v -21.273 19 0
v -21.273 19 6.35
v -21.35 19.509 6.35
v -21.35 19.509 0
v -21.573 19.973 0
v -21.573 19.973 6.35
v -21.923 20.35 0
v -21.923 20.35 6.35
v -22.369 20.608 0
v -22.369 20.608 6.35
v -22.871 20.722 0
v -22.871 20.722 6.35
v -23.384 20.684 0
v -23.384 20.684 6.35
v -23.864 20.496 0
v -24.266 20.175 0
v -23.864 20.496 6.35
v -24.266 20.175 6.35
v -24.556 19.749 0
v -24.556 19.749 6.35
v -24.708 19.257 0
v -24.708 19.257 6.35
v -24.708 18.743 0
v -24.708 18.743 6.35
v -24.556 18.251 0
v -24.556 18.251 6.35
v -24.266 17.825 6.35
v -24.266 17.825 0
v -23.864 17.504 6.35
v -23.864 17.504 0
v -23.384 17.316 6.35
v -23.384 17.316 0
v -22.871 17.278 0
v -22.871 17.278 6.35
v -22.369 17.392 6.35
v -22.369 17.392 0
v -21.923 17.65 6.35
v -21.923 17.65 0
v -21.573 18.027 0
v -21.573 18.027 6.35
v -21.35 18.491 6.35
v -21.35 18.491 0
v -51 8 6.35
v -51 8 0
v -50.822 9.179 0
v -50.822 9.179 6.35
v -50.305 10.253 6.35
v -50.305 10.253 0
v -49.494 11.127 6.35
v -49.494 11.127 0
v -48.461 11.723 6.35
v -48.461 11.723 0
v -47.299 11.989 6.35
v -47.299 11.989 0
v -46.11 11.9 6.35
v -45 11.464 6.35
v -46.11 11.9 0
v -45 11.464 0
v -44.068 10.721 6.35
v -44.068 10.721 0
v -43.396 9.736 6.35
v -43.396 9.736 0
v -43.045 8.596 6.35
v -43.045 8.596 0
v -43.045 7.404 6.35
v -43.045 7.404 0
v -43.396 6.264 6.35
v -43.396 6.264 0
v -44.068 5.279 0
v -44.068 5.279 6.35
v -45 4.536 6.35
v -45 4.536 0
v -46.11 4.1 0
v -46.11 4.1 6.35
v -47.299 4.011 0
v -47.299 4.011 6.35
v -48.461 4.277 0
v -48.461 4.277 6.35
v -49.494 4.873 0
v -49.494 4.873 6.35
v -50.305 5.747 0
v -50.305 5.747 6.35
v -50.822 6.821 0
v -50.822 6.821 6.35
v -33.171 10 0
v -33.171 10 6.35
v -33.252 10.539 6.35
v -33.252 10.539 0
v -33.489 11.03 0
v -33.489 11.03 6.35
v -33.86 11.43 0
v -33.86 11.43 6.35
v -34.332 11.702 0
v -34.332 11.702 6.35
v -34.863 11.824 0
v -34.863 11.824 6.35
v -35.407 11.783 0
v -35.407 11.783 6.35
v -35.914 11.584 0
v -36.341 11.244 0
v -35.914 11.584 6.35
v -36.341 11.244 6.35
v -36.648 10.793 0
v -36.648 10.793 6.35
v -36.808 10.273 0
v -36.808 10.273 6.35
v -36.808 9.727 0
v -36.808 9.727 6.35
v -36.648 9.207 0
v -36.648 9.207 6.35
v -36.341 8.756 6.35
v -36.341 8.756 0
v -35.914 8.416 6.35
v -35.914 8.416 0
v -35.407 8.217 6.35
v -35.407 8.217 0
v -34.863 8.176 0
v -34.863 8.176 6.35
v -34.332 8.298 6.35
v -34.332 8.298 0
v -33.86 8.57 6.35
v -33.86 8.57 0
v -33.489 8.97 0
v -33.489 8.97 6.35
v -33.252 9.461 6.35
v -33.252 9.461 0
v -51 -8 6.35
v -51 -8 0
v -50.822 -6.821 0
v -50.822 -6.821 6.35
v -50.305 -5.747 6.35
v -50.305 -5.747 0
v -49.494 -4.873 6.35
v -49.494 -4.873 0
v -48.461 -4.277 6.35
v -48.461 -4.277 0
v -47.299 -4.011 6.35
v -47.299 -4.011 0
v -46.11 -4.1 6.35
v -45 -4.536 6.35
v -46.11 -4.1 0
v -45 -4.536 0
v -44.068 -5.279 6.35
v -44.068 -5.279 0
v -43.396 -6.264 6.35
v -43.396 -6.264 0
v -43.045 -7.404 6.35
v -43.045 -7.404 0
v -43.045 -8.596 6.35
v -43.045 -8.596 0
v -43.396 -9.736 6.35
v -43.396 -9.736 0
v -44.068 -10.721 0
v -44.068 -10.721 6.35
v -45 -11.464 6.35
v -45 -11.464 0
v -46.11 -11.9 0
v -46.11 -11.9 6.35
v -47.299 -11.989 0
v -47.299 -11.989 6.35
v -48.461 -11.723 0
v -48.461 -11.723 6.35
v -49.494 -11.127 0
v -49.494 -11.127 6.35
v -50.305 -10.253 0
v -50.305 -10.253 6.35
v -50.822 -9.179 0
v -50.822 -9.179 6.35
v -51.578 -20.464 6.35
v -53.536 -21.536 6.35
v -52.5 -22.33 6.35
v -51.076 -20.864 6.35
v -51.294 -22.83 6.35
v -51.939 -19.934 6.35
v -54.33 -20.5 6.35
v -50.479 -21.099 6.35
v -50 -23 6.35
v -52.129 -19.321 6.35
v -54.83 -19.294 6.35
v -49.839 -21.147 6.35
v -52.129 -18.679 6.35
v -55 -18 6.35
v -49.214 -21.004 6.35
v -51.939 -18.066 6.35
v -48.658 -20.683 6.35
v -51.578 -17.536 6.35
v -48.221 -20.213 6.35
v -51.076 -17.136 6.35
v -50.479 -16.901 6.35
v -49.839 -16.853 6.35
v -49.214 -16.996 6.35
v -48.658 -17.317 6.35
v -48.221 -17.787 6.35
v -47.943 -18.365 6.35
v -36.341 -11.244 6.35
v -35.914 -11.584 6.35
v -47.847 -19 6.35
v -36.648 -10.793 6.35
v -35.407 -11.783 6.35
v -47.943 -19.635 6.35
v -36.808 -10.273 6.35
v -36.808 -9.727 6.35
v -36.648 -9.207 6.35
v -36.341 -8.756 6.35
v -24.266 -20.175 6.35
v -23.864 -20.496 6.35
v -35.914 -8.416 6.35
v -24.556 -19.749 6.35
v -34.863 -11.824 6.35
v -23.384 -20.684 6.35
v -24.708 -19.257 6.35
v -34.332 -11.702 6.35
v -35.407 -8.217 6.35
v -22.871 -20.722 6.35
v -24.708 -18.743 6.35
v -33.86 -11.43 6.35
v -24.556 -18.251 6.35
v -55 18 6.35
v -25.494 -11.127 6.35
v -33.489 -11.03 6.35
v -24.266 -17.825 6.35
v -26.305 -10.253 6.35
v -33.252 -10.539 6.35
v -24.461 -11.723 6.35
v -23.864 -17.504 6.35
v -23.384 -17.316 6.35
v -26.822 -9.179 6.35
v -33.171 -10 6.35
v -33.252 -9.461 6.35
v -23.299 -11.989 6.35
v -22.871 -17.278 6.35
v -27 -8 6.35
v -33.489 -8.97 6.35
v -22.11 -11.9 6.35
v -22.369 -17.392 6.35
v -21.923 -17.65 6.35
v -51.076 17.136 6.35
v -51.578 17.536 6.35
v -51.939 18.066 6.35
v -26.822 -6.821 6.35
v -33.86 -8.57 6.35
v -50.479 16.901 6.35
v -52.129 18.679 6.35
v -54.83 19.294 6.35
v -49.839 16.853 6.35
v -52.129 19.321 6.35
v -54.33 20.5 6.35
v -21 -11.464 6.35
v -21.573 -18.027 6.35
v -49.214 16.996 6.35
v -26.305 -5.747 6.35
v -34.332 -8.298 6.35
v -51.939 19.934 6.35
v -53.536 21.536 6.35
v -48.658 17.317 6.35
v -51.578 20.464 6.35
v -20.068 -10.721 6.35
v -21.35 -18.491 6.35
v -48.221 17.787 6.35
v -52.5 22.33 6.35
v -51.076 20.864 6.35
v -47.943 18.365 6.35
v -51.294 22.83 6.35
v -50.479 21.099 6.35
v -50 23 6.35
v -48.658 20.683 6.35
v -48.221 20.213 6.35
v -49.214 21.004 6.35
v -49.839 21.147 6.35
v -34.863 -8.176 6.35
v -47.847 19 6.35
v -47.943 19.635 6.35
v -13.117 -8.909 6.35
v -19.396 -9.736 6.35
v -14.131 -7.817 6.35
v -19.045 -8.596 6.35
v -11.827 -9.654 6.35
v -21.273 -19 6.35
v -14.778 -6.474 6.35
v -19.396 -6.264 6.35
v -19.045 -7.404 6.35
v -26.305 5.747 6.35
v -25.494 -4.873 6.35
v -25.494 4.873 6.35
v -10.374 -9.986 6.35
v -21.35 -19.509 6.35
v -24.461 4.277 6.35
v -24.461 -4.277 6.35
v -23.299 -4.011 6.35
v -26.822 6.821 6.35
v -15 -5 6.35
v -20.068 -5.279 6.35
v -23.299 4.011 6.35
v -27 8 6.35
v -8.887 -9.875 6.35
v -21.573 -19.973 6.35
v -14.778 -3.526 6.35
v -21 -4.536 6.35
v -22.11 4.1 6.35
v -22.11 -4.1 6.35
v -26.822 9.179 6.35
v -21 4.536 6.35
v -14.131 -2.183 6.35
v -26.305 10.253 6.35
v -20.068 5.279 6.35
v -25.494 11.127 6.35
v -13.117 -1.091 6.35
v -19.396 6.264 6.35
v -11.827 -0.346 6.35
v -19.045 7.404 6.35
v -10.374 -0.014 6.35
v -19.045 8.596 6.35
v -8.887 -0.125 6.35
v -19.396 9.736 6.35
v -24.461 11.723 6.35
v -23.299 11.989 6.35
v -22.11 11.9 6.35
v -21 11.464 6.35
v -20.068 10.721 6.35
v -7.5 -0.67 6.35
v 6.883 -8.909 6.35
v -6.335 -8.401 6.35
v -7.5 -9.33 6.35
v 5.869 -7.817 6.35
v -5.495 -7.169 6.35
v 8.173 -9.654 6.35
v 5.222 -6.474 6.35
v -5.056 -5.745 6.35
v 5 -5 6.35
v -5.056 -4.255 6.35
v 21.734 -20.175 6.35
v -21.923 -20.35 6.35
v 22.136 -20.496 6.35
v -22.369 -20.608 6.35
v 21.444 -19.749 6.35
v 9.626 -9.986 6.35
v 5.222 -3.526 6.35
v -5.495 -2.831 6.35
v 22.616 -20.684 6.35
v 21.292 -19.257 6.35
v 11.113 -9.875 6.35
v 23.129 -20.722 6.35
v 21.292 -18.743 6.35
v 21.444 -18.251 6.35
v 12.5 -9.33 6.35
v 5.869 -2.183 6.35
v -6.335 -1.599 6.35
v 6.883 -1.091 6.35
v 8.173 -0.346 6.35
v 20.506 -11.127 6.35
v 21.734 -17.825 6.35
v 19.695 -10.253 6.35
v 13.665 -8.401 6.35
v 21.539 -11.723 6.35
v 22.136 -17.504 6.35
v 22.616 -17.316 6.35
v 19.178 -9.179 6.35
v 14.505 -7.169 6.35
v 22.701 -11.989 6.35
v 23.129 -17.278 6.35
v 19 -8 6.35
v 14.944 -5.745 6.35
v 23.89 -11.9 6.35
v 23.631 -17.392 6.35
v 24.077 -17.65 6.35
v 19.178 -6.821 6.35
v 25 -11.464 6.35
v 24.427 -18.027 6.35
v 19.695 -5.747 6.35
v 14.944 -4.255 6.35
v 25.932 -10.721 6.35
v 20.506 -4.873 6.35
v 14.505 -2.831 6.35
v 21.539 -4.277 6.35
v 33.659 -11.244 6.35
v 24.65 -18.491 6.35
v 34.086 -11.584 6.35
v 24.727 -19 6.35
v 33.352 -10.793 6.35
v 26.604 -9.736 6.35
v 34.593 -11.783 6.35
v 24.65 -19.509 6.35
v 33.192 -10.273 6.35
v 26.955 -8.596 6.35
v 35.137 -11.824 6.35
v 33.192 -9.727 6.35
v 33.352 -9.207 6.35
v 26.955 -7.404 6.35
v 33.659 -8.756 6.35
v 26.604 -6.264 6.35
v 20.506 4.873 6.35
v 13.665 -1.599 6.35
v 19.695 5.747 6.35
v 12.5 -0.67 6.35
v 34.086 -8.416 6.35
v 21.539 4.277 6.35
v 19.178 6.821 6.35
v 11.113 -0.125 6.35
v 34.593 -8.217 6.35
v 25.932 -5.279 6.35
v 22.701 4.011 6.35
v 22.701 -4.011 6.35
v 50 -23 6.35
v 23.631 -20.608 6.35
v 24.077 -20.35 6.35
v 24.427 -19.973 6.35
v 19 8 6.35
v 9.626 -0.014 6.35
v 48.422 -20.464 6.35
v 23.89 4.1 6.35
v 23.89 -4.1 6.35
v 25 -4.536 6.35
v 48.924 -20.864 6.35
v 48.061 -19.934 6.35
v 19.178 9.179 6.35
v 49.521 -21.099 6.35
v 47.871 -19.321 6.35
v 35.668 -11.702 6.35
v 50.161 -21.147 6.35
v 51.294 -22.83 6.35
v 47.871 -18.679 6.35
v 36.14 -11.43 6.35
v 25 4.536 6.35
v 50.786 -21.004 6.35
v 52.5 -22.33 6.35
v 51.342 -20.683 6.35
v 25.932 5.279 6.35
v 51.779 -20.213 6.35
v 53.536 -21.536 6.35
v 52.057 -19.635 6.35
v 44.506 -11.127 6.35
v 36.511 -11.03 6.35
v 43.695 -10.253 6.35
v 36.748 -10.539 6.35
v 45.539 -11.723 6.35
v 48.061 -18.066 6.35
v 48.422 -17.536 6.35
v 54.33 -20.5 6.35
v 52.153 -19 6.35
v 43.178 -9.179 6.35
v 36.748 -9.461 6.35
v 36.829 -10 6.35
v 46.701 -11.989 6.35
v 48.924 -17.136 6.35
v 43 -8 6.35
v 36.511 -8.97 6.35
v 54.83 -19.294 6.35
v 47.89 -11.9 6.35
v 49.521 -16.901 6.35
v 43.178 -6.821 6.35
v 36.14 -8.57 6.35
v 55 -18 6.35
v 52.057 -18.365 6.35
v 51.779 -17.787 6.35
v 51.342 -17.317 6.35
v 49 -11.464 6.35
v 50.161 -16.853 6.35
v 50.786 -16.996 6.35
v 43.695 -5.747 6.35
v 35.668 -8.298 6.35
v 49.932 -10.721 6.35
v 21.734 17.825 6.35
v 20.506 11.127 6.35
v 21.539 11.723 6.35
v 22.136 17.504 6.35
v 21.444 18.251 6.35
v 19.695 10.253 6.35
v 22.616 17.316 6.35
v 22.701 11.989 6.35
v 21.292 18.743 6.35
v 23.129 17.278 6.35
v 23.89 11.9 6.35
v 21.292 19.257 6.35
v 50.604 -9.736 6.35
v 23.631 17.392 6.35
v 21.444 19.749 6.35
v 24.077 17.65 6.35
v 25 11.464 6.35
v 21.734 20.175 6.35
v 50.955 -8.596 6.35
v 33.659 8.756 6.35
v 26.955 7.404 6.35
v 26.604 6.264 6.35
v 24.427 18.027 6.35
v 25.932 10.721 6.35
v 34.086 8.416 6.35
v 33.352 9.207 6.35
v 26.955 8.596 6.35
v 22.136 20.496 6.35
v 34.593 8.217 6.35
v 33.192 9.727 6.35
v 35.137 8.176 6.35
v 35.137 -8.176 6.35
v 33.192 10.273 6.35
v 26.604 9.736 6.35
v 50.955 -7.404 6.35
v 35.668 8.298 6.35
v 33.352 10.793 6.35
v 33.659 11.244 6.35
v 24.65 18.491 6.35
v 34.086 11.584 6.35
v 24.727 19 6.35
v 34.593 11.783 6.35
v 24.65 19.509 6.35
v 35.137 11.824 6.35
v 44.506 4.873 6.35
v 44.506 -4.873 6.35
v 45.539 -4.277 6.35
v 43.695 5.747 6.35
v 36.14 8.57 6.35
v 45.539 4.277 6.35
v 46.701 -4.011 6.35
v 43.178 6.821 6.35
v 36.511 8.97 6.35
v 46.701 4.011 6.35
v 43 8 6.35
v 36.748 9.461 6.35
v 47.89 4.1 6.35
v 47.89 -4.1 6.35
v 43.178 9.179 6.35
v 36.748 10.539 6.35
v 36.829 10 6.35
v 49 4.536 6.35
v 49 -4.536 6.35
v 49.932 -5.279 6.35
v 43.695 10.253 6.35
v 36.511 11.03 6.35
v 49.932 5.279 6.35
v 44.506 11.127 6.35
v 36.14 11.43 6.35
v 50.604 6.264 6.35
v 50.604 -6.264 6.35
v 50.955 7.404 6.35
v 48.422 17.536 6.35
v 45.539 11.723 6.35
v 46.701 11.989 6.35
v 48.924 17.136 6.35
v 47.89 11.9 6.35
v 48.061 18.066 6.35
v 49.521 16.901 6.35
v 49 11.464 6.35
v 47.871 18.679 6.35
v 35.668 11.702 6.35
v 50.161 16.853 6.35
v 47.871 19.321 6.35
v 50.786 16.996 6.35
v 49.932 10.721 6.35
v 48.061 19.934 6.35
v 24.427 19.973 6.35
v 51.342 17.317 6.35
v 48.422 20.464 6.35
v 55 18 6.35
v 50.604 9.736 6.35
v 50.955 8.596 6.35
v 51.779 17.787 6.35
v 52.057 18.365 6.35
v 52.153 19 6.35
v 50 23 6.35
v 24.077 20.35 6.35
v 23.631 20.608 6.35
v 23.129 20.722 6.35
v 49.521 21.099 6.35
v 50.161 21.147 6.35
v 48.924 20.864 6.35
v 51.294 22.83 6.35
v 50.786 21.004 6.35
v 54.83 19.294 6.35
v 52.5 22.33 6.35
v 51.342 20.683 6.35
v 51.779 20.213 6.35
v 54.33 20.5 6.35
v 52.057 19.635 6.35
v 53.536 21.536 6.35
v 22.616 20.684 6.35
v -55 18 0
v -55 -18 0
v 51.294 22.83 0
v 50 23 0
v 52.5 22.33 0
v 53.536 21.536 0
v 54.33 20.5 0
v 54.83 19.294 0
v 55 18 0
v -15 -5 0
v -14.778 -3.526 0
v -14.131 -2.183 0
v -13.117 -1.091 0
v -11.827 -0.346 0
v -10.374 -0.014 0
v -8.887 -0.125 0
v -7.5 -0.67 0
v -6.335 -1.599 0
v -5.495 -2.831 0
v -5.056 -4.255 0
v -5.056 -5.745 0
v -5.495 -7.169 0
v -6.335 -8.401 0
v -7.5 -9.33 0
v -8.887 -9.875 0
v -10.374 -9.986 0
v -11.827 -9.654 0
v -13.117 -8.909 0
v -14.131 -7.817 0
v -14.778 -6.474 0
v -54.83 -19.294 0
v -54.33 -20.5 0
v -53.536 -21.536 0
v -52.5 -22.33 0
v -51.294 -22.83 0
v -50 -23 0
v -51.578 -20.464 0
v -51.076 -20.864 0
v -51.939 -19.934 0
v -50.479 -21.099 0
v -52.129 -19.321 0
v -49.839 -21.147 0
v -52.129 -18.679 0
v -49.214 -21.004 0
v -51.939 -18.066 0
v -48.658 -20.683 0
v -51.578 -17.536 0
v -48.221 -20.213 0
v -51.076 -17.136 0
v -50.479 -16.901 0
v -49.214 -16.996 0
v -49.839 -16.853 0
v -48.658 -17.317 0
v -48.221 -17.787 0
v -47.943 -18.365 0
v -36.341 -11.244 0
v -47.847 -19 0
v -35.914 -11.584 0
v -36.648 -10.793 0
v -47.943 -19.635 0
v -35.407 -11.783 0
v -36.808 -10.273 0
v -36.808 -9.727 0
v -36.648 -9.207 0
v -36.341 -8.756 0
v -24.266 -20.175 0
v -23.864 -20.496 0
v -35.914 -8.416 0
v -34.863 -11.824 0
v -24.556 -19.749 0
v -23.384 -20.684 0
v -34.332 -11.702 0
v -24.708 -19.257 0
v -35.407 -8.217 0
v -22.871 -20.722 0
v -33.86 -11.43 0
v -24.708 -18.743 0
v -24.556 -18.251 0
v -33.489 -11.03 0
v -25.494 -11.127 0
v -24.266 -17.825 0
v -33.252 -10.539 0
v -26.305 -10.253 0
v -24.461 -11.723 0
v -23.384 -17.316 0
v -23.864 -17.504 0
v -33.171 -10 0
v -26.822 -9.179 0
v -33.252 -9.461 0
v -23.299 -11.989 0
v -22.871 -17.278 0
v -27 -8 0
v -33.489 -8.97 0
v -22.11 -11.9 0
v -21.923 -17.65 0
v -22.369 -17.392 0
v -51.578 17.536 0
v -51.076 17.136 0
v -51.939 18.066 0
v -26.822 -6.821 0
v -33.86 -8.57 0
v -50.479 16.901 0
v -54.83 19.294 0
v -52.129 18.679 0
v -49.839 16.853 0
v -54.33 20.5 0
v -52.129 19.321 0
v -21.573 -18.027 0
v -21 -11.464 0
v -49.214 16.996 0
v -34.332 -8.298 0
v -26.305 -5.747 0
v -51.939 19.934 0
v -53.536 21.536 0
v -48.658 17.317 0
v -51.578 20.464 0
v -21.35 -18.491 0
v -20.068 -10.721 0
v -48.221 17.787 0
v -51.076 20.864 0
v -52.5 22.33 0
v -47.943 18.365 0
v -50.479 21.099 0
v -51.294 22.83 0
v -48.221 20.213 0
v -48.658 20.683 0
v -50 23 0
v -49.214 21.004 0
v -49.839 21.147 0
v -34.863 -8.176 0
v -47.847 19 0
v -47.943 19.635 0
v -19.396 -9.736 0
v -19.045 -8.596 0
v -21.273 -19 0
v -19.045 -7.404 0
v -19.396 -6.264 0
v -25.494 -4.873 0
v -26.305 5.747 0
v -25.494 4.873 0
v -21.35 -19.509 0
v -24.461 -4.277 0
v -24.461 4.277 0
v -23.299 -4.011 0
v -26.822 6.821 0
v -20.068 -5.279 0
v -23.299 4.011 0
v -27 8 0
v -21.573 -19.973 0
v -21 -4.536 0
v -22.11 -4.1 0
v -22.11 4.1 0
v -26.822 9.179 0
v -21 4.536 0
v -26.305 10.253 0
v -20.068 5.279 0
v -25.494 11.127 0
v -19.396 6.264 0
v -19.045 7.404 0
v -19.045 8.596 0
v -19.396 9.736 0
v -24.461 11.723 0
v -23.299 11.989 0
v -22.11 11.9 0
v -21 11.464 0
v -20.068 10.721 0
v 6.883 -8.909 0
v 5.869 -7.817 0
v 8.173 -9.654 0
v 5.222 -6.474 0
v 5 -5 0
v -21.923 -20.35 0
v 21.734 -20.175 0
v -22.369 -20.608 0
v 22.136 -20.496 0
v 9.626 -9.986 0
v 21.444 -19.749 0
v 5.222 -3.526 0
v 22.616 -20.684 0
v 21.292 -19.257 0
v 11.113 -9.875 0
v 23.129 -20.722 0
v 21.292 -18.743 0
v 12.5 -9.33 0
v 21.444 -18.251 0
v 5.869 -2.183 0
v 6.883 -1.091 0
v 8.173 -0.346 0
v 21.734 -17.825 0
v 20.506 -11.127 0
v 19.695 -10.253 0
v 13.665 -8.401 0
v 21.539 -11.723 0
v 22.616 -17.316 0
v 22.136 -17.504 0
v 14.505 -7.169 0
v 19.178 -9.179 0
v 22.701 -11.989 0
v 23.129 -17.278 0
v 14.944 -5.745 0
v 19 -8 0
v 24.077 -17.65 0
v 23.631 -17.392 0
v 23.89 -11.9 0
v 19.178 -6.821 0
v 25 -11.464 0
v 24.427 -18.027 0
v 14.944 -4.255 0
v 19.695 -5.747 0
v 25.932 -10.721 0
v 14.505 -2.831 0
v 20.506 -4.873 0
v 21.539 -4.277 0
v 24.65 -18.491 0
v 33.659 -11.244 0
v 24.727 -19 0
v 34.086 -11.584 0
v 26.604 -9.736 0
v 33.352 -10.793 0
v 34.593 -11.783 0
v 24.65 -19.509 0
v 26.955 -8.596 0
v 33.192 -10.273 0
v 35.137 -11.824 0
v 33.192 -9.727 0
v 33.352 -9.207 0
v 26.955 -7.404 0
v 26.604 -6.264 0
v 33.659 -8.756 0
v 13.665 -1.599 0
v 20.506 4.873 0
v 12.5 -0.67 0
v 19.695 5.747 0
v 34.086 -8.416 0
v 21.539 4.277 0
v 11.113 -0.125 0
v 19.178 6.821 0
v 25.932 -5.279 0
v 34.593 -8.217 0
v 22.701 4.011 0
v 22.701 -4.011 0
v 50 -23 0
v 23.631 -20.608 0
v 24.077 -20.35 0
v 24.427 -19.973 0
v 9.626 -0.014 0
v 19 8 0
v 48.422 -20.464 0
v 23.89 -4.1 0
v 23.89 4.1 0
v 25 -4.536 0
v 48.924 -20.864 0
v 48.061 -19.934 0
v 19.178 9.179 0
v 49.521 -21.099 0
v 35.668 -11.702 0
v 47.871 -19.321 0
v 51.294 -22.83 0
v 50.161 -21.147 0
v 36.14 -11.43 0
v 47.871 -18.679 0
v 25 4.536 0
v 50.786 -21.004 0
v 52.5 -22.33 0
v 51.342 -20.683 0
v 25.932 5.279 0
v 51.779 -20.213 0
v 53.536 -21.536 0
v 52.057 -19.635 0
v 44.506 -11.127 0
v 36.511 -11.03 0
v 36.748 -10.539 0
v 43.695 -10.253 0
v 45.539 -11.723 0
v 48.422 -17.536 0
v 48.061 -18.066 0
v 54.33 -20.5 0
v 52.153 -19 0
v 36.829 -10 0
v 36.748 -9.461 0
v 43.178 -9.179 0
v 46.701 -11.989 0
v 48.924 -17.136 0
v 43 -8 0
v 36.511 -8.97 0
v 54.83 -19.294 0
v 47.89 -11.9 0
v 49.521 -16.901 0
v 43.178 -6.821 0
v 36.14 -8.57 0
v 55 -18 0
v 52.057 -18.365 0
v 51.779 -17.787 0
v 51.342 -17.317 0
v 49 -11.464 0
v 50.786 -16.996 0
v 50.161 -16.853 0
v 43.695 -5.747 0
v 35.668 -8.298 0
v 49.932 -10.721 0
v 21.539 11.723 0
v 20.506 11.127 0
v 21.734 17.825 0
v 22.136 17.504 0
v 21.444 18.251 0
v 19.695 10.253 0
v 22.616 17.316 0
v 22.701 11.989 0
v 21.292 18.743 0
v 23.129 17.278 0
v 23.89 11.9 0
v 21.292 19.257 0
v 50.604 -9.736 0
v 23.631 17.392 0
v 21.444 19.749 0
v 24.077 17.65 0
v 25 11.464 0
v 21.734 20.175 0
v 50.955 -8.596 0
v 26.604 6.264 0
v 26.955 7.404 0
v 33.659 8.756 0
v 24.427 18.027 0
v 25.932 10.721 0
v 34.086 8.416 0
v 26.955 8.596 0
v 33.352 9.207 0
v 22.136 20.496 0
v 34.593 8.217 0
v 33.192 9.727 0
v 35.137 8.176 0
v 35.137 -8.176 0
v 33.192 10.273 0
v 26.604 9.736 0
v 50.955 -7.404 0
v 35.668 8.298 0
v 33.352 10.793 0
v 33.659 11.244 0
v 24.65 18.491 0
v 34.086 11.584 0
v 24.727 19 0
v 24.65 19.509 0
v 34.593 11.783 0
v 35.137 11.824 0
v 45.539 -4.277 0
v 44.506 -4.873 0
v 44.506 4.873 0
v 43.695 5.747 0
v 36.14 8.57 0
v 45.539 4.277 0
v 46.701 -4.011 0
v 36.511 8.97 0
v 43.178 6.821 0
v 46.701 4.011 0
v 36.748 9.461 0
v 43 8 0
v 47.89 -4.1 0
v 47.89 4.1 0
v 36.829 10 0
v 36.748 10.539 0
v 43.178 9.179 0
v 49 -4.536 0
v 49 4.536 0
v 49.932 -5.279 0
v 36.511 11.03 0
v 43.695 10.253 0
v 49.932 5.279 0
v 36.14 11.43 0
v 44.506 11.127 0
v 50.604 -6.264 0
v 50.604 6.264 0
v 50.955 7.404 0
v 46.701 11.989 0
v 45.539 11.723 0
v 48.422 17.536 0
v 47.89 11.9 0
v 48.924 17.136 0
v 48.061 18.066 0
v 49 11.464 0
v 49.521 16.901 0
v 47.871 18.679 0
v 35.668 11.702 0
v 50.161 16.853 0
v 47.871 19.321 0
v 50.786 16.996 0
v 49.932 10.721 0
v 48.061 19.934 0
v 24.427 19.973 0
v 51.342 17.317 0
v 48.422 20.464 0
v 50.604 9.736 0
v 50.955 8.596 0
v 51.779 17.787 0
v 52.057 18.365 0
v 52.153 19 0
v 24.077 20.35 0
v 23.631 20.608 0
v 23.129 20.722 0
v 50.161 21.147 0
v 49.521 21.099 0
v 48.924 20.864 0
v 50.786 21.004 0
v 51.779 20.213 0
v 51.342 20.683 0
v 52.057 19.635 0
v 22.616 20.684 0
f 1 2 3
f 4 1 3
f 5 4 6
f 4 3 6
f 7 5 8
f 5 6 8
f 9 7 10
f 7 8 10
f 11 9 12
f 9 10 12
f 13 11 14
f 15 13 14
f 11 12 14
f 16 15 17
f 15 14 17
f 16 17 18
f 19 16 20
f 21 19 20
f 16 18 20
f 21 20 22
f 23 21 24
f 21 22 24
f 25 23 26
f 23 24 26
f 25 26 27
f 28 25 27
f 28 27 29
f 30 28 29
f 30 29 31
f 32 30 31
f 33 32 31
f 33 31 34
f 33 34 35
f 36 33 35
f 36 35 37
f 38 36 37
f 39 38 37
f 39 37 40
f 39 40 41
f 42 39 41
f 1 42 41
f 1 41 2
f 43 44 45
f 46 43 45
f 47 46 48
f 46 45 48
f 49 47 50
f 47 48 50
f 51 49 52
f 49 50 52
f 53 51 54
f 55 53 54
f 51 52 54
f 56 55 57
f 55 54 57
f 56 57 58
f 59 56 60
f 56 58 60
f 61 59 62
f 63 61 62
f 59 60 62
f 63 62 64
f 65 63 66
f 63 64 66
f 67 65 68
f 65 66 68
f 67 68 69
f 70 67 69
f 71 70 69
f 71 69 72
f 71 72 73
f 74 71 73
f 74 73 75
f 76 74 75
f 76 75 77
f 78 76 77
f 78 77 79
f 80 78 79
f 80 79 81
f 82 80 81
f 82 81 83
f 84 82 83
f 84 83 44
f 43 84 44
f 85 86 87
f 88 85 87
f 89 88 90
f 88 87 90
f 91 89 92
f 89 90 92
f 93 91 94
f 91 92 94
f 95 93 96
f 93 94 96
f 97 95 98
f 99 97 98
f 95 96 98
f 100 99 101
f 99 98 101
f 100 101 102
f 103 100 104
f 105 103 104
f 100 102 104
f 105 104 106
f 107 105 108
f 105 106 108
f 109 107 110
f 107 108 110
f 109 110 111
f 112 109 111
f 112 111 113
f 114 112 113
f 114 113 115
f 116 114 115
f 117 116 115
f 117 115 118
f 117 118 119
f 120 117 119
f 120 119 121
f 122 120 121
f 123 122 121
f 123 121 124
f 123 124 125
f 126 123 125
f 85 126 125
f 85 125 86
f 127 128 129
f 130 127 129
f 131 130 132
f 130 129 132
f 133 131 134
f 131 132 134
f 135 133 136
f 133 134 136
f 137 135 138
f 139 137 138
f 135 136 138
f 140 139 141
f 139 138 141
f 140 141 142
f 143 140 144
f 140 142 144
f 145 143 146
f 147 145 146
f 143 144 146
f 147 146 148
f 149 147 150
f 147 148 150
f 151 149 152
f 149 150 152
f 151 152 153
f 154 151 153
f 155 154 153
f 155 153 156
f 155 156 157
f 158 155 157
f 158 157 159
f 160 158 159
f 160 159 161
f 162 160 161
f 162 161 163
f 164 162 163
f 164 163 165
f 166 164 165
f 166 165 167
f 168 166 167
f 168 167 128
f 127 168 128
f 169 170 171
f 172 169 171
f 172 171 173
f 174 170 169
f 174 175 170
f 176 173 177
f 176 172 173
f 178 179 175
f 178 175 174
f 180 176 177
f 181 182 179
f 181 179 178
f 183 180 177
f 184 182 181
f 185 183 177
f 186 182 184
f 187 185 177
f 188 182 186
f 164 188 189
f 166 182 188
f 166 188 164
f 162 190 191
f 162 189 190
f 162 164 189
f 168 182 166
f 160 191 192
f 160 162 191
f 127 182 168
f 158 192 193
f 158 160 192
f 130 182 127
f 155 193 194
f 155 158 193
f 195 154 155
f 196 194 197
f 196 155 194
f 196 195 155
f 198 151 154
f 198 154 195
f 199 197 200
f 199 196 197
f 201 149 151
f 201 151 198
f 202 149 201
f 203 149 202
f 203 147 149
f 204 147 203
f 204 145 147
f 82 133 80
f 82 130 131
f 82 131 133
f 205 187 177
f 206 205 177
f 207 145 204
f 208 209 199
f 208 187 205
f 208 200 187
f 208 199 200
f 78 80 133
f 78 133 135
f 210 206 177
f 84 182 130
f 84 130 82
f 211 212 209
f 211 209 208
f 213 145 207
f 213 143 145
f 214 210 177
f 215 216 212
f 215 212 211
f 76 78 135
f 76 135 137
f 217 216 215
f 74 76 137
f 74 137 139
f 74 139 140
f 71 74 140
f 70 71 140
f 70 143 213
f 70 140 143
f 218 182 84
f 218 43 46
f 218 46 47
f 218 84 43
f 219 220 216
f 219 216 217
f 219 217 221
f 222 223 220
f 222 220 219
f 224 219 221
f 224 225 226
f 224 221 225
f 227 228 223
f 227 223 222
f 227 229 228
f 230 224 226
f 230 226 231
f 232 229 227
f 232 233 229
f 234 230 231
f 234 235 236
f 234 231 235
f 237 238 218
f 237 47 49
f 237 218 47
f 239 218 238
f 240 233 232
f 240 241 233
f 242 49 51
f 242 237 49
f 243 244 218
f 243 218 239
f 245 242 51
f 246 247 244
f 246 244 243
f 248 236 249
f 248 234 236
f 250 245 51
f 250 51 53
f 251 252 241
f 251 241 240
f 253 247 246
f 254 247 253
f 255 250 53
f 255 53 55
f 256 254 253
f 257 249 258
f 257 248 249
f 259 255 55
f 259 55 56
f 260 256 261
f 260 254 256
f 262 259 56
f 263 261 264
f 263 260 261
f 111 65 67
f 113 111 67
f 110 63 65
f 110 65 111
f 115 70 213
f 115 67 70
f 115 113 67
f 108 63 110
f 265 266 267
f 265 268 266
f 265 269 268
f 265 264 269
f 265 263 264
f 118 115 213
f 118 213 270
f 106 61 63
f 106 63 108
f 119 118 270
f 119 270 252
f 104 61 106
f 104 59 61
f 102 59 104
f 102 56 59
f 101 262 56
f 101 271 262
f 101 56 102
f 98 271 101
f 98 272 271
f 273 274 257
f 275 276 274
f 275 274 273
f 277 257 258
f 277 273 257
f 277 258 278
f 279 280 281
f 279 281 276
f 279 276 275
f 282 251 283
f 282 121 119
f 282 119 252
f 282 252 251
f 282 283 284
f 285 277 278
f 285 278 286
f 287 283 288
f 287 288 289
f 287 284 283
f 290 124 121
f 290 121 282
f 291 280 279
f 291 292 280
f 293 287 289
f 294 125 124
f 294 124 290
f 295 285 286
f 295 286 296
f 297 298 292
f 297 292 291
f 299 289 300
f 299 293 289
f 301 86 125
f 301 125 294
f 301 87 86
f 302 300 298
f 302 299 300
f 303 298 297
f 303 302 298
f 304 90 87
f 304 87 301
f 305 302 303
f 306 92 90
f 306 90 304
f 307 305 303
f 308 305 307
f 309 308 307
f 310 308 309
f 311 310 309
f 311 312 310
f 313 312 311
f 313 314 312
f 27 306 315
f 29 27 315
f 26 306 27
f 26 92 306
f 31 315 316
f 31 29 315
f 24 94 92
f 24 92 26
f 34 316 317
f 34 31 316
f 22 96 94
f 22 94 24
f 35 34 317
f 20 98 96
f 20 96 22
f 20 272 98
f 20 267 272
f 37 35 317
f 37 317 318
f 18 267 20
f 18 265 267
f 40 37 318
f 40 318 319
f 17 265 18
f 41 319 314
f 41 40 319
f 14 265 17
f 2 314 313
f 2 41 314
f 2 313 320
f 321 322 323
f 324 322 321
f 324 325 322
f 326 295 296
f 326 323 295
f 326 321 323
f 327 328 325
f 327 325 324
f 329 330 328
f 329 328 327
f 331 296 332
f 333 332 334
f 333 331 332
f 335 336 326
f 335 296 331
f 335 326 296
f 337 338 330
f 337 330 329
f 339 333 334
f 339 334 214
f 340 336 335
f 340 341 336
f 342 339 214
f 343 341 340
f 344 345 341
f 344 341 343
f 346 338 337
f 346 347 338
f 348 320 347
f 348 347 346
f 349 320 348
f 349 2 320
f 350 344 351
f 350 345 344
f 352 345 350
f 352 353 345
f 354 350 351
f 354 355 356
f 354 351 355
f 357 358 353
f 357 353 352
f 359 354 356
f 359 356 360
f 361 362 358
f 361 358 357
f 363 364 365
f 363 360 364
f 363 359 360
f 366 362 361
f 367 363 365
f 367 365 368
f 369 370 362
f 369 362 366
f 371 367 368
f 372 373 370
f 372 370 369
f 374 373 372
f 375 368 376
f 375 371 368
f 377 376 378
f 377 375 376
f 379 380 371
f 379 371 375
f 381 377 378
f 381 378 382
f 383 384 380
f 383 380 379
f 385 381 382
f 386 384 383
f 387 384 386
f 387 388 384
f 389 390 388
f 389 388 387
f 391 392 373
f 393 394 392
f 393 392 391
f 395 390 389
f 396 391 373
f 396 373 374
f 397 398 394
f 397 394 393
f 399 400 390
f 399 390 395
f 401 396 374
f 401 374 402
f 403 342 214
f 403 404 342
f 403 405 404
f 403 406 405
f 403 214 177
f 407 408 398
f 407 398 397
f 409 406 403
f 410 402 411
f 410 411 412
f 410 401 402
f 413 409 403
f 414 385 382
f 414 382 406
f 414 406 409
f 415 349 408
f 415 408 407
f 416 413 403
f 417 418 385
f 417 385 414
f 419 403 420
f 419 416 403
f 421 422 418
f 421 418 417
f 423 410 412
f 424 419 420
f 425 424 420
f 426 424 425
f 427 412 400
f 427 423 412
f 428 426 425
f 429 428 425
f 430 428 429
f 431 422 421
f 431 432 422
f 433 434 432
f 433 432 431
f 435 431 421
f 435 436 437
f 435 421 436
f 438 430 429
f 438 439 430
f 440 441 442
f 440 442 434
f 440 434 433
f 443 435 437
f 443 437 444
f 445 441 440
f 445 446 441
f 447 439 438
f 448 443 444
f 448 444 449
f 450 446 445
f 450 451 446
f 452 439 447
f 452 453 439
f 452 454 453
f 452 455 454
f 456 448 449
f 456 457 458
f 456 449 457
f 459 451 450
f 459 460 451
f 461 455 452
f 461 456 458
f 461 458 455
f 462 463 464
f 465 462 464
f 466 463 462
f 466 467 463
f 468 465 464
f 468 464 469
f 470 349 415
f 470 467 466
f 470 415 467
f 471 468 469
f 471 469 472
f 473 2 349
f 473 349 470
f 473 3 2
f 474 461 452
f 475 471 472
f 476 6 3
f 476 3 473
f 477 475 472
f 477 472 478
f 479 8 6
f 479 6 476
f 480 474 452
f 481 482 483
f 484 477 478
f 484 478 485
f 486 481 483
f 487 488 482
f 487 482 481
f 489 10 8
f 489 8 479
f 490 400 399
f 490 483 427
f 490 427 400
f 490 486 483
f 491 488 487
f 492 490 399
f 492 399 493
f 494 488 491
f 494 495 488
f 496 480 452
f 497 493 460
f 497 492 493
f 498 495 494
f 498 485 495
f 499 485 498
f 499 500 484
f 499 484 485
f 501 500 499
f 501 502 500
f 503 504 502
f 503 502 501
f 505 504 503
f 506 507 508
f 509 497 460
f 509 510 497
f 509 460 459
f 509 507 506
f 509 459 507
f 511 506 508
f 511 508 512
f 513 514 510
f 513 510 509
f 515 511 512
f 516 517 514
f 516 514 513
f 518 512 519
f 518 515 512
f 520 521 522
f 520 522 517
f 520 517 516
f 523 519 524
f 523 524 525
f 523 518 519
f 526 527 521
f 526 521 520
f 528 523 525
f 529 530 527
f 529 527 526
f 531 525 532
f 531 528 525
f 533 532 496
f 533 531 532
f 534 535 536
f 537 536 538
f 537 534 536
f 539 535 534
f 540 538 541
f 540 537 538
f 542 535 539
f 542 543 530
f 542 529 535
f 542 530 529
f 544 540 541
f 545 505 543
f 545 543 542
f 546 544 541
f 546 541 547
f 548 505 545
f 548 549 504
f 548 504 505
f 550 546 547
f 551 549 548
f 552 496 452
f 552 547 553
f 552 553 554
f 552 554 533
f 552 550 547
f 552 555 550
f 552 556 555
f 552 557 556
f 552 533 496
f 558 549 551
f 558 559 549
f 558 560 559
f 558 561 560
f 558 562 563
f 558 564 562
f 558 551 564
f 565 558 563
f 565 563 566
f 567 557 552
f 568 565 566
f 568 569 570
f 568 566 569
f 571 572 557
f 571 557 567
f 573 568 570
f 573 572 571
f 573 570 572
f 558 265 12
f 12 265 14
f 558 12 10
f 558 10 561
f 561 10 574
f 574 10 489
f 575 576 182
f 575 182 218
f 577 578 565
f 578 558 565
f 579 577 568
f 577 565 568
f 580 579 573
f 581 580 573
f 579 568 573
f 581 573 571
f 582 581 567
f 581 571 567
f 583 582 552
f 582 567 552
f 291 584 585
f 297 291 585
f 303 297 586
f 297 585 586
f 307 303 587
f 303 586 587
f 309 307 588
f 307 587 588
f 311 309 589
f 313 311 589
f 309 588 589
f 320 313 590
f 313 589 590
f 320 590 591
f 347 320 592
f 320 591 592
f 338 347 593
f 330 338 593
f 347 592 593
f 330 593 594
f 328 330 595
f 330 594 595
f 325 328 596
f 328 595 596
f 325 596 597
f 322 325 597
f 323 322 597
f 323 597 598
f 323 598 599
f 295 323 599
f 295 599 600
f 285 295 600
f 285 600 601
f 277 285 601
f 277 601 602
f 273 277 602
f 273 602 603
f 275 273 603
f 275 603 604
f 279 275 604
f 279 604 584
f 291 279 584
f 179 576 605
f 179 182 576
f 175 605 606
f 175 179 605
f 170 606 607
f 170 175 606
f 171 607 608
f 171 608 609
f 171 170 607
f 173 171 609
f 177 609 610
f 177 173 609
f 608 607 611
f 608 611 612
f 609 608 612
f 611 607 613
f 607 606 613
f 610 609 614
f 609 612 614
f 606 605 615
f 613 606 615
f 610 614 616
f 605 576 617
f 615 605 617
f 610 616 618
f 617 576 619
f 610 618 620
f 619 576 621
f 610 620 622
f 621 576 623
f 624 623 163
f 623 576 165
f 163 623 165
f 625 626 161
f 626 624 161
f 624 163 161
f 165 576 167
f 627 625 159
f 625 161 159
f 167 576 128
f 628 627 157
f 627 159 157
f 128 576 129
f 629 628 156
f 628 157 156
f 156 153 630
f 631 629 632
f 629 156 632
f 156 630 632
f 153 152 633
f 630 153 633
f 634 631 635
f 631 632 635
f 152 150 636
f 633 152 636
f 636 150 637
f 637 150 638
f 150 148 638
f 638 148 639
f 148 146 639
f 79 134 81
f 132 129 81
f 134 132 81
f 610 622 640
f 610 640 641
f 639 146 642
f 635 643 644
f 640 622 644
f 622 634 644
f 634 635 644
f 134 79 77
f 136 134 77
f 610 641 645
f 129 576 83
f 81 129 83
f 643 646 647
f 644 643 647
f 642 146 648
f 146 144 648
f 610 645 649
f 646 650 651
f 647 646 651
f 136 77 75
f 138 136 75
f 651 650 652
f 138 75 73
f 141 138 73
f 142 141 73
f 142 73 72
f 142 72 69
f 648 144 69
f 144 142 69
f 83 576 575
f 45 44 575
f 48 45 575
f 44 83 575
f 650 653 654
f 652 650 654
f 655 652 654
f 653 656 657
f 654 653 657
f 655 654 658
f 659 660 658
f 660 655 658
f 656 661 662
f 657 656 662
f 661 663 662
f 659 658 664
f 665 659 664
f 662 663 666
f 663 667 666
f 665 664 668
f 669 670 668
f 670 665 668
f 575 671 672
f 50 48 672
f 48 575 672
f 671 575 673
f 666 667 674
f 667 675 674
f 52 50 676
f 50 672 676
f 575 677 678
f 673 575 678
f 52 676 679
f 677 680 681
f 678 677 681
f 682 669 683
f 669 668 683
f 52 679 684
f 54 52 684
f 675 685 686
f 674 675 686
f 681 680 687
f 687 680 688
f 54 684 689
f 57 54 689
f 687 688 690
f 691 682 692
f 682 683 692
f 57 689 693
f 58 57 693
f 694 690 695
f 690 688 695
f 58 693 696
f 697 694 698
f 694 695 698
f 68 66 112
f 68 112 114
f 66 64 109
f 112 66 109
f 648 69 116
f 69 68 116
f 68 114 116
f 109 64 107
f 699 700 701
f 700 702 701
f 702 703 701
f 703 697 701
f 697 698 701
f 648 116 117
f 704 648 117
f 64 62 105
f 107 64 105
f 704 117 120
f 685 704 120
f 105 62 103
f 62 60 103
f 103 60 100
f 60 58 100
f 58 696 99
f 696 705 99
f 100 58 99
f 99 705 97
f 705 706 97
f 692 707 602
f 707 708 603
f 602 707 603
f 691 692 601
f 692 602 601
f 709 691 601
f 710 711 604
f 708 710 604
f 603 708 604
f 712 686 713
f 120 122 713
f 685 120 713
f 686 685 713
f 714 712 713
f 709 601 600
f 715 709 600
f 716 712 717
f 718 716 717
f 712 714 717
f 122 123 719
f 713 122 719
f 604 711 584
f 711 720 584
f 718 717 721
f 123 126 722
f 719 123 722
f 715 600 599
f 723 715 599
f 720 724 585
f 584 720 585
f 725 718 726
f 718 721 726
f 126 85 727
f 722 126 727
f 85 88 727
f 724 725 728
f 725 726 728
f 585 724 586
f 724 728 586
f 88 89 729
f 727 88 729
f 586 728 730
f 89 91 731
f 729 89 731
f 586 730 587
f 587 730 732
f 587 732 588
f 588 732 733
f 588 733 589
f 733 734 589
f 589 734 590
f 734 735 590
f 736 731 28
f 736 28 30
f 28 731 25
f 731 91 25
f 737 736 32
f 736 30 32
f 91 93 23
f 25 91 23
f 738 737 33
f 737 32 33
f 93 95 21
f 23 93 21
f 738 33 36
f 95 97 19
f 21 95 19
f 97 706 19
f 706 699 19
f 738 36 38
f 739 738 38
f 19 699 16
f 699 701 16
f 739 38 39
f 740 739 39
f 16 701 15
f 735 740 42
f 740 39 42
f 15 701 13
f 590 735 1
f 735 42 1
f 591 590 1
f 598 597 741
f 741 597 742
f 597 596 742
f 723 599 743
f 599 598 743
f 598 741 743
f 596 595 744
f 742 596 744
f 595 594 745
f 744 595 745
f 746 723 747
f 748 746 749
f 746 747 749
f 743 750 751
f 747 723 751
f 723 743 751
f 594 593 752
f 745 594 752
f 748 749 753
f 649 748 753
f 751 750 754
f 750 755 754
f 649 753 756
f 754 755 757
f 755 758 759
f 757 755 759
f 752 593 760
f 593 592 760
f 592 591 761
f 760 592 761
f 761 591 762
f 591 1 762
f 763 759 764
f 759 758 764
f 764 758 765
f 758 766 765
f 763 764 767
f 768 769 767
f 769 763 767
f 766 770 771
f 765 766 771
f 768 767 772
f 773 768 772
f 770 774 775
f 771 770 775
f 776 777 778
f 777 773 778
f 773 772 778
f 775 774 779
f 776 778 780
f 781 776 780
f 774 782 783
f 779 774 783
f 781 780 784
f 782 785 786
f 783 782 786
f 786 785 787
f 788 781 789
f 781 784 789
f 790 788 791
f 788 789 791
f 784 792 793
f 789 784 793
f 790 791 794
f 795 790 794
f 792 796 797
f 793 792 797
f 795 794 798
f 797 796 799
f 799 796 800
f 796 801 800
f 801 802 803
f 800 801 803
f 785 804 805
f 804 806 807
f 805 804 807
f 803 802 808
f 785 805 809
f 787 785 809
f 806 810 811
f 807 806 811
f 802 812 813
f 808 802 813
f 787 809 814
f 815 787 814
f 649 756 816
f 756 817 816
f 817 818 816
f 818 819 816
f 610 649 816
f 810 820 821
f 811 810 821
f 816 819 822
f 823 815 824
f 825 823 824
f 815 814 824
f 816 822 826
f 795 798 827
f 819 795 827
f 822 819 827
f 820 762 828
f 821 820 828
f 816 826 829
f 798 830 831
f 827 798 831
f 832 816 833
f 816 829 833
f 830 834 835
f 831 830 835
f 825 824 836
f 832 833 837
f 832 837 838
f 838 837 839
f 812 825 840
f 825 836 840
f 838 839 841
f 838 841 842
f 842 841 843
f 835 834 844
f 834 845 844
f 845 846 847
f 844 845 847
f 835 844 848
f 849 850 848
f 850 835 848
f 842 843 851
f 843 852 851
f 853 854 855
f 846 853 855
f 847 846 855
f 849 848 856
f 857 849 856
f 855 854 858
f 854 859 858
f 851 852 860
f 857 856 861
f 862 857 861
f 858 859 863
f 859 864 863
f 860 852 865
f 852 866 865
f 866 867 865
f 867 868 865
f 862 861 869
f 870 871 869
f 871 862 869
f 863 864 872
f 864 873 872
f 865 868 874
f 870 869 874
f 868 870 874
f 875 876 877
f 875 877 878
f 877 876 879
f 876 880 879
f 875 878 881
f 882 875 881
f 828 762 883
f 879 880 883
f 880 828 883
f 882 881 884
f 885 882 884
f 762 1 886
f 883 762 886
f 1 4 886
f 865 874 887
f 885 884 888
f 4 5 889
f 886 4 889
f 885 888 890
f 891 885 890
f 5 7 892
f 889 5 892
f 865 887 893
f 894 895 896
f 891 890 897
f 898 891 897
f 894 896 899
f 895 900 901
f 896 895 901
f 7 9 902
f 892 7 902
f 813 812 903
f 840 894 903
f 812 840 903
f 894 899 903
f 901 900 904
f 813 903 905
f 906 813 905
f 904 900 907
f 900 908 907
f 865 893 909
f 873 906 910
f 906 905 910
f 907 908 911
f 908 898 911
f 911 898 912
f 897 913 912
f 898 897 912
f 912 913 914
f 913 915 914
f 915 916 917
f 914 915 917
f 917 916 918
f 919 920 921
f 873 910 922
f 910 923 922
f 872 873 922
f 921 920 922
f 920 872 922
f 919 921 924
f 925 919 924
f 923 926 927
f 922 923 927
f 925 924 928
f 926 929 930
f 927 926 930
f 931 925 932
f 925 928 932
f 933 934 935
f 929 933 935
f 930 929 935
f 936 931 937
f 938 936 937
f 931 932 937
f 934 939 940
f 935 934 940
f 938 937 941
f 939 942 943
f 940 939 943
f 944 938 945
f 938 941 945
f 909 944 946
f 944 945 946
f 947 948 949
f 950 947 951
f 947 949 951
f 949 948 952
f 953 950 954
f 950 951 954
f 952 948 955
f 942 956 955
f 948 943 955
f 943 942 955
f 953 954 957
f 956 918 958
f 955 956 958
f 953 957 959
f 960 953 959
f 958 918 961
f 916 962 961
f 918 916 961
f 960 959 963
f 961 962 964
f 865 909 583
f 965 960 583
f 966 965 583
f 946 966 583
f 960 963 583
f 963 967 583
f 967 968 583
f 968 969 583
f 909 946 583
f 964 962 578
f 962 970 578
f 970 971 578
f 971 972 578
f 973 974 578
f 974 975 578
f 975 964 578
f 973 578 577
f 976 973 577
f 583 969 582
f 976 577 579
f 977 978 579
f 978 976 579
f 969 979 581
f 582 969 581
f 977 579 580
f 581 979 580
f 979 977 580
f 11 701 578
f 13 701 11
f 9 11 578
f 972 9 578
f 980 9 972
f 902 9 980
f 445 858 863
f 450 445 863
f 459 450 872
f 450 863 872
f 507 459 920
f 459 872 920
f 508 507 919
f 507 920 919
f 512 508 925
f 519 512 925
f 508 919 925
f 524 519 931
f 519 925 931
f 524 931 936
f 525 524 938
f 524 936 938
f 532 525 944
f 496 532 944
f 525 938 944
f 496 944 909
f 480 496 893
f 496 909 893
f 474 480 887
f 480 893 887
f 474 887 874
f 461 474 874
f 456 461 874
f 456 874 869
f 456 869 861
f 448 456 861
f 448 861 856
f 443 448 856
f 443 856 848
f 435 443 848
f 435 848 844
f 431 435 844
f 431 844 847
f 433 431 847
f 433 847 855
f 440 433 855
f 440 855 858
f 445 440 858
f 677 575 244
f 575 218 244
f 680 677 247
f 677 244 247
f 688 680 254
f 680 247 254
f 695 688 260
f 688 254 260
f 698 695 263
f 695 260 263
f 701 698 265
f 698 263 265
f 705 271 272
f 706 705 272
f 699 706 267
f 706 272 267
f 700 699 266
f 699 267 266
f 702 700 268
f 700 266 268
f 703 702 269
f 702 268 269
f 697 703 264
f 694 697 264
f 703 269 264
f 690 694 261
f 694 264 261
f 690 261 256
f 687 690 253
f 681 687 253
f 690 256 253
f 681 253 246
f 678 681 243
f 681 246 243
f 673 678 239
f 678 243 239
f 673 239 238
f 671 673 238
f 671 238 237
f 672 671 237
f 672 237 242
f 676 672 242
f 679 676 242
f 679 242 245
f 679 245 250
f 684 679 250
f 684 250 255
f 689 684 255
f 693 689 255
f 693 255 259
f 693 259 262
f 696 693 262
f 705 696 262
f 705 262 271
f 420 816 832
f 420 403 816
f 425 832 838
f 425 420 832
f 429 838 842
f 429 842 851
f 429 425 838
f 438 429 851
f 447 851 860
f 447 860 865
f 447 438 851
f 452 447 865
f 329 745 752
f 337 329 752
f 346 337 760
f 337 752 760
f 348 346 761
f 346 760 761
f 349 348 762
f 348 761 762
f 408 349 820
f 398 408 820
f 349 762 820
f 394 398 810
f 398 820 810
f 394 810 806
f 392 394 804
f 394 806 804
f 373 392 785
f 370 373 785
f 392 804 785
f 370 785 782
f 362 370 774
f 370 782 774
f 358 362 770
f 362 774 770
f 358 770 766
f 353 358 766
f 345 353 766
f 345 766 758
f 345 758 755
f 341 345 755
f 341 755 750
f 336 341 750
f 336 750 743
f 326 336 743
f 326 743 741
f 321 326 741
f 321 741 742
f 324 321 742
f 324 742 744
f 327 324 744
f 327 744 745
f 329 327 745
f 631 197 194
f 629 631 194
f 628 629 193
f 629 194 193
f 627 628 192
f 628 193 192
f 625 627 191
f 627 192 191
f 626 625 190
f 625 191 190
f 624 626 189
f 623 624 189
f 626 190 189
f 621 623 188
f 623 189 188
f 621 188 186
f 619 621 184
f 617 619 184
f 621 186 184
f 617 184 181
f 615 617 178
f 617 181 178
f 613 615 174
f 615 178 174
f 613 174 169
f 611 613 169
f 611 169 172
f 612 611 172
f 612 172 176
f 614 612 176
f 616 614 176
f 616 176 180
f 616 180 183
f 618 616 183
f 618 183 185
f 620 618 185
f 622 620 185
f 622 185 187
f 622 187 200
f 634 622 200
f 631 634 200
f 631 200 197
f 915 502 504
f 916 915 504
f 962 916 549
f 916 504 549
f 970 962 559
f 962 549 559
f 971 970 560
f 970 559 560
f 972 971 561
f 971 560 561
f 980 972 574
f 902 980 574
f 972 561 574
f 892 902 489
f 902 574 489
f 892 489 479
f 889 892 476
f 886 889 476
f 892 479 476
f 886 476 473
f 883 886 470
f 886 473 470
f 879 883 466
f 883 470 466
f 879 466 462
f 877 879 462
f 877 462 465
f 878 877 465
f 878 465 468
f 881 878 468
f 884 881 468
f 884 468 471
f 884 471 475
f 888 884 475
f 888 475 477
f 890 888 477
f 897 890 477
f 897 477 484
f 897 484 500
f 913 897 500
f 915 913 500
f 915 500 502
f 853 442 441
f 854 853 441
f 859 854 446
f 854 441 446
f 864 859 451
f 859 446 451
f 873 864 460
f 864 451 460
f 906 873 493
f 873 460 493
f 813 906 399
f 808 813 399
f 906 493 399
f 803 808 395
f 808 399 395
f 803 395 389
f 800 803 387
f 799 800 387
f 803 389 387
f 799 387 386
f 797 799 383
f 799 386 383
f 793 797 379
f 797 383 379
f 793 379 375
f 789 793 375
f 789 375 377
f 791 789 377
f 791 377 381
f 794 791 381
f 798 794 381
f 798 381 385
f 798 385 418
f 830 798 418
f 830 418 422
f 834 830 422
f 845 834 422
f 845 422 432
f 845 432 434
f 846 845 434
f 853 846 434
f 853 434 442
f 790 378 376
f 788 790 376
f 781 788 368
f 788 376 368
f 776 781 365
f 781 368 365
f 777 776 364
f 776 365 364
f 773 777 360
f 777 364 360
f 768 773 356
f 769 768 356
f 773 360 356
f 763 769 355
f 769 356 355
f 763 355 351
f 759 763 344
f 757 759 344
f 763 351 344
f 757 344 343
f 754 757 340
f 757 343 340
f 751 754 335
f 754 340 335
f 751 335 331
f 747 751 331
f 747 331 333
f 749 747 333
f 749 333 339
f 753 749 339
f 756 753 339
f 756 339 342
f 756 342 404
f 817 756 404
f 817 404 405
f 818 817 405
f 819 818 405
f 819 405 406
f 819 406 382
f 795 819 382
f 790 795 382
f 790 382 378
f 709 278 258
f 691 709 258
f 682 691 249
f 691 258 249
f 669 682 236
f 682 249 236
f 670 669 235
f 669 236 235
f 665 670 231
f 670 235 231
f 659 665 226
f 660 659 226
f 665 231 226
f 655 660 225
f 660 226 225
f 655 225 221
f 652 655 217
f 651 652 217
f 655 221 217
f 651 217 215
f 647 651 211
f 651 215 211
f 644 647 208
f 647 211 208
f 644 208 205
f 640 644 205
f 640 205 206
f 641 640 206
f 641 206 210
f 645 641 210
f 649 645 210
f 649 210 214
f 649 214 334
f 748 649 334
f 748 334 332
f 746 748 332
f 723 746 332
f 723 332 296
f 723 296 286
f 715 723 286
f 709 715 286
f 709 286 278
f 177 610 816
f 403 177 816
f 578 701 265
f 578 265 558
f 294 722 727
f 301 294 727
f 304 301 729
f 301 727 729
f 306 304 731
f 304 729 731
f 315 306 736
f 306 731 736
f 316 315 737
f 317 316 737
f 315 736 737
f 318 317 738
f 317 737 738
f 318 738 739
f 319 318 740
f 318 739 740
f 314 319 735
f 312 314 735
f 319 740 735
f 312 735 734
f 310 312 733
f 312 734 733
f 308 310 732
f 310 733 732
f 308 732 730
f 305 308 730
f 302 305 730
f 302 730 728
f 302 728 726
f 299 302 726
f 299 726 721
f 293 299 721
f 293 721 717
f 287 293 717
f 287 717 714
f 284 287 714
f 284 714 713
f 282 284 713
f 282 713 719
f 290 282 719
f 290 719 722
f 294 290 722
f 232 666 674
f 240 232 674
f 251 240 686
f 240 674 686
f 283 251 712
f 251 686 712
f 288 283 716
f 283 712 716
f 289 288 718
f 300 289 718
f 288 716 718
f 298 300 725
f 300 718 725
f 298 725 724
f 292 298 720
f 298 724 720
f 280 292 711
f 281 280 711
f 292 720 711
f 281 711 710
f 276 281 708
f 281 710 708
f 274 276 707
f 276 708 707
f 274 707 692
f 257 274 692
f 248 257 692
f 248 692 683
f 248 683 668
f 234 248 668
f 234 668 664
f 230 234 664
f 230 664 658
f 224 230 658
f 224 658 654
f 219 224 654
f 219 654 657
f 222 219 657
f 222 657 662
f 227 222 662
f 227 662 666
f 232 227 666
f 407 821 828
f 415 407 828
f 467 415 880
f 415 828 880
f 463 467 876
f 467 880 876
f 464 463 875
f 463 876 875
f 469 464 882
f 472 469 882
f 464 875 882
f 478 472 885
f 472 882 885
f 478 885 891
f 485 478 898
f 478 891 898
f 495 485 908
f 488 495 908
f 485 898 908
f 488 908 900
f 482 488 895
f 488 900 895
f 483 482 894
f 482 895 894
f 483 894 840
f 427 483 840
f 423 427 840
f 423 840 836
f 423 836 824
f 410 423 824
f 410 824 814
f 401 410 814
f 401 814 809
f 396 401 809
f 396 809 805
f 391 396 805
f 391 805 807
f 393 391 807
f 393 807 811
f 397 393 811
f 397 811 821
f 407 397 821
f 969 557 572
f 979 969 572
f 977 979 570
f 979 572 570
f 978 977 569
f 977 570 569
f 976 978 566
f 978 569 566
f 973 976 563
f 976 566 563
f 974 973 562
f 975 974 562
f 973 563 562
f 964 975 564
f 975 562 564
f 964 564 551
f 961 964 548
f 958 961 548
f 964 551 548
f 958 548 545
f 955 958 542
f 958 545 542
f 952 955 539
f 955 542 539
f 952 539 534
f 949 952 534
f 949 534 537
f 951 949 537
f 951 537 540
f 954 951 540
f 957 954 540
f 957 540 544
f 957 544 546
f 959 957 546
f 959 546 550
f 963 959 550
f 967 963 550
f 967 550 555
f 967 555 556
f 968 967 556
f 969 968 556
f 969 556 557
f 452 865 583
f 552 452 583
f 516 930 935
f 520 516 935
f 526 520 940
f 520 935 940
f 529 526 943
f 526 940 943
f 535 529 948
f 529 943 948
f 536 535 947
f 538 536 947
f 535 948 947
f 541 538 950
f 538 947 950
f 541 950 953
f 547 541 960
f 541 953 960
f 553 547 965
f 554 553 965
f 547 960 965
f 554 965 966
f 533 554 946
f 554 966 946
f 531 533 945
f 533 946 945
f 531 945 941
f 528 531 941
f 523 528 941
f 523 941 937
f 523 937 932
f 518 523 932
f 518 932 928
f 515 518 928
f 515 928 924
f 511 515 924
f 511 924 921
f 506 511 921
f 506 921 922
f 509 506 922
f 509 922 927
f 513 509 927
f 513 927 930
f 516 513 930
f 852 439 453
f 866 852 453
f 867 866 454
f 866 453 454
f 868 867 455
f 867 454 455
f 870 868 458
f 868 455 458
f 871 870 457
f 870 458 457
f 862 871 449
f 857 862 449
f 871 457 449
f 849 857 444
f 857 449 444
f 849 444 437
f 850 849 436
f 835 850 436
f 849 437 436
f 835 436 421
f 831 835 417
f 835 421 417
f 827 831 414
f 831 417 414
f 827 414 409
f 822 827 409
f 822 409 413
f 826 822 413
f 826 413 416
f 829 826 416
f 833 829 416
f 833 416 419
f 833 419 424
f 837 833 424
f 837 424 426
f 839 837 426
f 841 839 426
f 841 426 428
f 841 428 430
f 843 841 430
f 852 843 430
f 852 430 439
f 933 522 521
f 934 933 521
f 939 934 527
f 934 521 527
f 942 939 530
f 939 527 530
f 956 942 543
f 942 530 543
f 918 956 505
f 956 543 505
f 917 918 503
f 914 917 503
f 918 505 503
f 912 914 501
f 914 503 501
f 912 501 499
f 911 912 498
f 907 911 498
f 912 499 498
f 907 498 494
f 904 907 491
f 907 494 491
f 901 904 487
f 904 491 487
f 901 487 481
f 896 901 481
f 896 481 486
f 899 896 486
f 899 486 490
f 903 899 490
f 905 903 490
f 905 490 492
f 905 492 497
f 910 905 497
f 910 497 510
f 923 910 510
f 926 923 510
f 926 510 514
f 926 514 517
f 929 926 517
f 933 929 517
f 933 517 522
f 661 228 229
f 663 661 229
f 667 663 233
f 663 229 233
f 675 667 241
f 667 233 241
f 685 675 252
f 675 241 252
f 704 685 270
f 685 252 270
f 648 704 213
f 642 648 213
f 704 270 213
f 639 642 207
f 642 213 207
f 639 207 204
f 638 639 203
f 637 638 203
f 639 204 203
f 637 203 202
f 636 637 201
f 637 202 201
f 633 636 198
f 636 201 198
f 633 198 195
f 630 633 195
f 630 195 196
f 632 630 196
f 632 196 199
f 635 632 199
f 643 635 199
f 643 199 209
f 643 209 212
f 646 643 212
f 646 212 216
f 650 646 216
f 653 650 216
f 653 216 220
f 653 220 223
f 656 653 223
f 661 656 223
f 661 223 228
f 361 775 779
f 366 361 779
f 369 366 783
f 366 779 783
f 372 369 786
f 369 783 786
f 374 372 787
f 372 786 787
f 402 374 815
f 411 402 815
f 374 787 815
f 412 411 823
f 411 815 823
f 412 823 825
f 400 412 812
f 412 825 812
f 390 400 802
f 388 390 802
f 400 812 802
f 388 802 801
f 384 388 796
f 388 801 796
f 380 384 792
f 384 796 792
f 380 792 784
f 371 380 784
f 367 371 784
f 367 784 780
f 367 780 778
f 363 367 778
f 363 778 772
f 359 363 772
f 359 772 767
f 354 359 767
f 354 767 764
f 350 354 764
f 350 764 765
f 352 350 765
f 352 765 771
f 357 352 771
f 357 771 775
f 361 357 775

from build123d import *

# Parameters (mm, degrees)
SKETCH1_W             = 110
SKETCH1_H             = 46
BOSS_EXTRUDE1_DEPTH   = 6.35
SKETCH5_R             = 5
CUT_EXTRUDE1_DEPTH    = 7.35
SKETCH7_R             = 4
CUT_EXTRUDE2_DEPTH    = 7.35
FILLET1_R             = 5
F_8_32_TAPPED_HOLE1_D = 3.4544
F_8_CLEARANCE_HOLE1_D = 4.3053
F_6_CLEARANCE_HOLE2_D = 3.6576


with BuildPart() as part:
    # Sketch1 → Boss-Extrude1 (new body)
    with BuildSketch(Plane.XY):
        Rectangle(SKETCH1_W, SKETCH1_H)
    extrude(amount=BOSS_EXTRUDE1_DEPTH)

    # Sketch5 → Cut-Extrude1 (cut, through all)
    with BuildSketch(Plane(origin=(0, 0, 0), x_dir=(-1, 0, 0), z_dir=(0, 0, -1))):
        with Locations((-10, -5)):
            Circle(SKETCH5_R)
        with Locations((10, -5)):
            Circle(SKETCH5_R)
    extrude(amount=-CUT_EXTRUDE1_DEPTH, mode=Mode.SUBTRACT)

    # Sketch7 → Cut-Extrude2 (cut, through all)
    with BuildSketch(Plane(origin=(0, 0, 0), x_dir=(-1, 0, 0), z_dir=(0, 0, -1))):
        with Locations((-23, 8)):
            Circle(SKETCH7_R)
        with Locations((-23, -8)):
            Circle(SKETCH7_R)
        with Locations((23, -8)):
            Circle(SKETCH7_R)
        with Locations((23, 8)):
            Circle(SKETCH7_R)
        with Locations((-47, 8)):
            Circle(SKETCH7_R)
        with Locations((-47, -8)):
            Circle(SKETCH7_R)
        with Locations((47, 8)):
            Circle(SKETCH7_R)
        with Locations((47, -8)):
            Circle(SKETCH7_R)
    extrude(amount=-CUT_EXTRUDE2_DEPTH, mode=Mode.SUBTRACT)

    # Fillet1
    fillet1_edges = [part.edges().sort_by_distance(p)[0] for p in [
        (-55, -23, 3.175),
        (-55, 23, 3.175),
        (55, 23, 3.175),
        (55, -23, 3.175),
    ]]
    fillet(fillet1_edges, radius=FILLET1_R)

    # #8-32 Tapped Hole1 (through all)
    with Locations(Plane(origin=(0, 0, 0), x_dir=(-1, 0, 0), z_dir=(0, 0, -1))):
        with Locations((-23, 19), (23, 19), (23, -19), (-23, -19)):
            Hole(F_8_32_TAPPED_HOLE1_D / 2)

    # #8 Clearance Hole1 (through all)
    with Locations(Plane(origin=(0, 0, 0), x_dir=(-1, 0, 0), z_dir=(0, 0, -1))):
        with Locations((-50, 19), (-50, -19), (50, -19), (50, 19)):
            Hole(F_8_CLEARANCE_HOLE1_D / 2)

    # #6 Clearance Hole2 (through all)
    with Locations(Plane(origin=(0, 0, 0), x_dir=(-1, 0, 0), z_dir=(0, 0, -1))):
        with Locations((-35, 10), (-35, -10), (35, -10), (35, 10)):
            Hole(F_6_CLEARANCE_HOLE2_D / 2)


solid = part.part
